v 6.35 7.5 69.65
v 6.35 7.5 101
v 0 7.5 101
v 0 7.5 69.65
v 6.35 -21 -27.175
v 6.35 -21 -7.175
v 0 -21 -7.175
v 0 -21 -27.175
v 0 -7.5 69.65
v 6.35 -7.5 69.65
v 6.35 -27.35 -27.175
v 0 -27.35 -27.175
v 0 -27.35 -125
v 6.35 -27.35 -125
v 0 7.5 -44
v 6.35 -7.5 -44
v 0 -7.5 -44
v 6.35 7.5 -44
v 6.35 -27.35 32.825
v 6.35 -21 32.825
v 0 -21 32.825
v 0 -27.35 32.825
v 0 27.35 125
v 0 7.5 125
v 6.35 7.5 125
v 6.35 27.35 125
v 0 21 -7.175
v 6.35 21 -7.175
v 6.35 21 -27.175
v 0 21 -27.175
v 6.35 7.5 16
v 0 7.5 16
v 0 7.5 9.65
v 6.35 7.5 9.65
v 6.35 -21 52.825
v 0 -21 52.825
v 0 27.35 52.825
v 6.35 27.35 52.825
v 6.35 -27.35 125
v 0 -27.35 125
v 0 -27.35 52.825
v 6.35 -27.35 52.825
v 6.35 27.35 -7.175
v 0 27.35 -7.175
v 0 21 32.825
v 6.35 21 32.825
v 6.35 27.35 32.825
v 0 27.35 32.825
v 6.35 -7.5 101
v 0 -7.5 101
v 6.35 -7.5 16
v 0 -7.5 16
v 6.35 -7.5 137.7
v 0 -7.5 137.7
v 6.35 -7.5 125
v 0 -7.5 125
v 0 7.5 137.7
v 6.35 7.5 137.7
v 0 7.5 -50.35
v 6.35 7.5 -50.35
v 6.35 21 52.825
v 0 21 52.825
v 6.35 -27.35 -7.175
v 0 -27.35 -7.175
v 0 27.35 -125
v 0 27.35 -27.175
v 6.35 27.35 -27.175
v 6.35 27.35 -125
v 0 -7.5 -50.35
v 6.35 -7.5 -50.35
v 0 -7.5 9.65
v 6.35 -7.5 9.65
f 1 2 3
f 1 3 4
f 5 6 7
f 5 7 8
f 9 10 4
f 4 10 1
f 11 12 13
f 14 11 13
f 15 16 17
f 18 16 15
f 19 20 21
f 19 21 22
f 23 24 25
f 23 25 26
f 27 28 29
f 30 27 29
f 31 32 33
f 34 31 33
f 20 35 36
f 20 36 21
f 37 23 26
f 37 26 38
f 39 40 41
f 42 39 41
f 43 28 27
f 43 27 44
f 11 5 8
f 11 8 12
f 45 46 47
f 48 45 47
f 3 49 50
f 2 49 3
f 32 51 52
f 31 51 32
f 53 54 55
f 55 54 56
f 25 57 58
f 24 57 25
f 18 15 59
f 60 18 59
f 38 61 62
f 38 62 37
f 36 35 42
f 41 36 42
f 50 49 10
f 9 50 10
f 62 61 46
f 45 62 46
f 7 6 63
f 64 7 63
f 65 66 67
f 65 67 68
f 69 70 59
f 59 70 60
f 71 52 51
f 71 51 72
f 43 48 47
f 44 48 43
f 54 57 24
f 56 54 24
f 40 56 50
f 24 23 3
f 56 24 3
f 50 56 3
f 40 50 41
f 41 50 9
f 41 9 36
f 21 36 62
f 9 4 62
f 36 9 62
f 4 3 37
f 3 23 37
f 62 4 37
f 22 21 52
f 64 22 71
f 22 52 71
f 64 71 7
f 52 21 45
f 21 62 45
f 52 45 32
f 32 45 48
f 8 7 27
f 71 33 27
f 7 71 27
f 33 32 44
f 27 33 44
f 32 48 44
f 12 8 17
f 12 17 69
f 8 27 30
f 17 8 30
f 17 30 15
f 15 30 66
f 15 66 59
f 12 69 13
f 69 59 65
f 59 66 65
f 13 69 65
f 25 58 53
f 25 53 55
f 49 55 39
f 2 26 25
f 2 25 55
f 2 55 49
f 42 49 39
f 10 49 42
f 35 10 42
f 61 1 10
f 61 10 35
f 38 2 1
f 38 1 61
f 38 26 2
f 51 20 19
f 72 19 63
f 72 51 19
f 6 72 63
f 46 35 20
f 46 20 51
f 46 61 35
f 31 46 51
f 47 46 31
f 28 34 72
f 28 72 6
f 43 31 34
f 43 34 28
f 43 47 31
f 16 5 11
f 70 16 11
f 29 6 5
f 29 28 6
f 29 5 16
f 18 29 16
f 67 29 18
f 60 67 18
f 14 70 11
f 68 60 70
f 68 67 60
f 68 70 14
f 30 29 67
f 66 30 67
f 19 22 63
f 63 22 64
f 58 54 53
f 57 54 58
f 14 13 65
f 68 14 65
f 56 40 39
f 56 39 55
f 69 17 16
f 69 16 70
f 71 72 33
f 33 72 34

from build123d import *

# Parameters (mm, degrees)
SKETCH1_W           = 250
SKETCH1_H           = 54.7
SKETCH1_W_2         = 12.7
SKETCH1_H_2         = 15
BOSS_EXTRUDE1_DEPTH = 6.35
SKETCH2_W           = 6.35
SKETCH2_H           = 15
CUT_EXTRUDE1_DEPTH  = 141.533394608
LPATTERN1_COUNT     = 3
LPATTERN1_PITCH     = 60
SKETCH3_W           = 25
SKETCH3_H           = 15
CUT_EXTRUDE2_DEPTH  = 141.533394608
SKETCH4_W           = 20
SKETCH4_H           = 6.35
CUT_EXTRUDE3_DEPTH  = 141.533394608


with BuildPart() as part:
    # Sketch1 → Boss-Extrude1 (new body)
    with BuildSketch(Plane(origin=(0, 0, 0), x_dir=(0, 0, -1), z_dir=(1, 0, 0))):
        Rectangle(SKETCH1_W, SKETCH1_H)
        with Locations((-131.35, 0)):
            Rectangle(SKETCH1_W_2, SKETCH1_H_2)
    extrude(amount=BOSS_EXTRUDE1_DEPTH)

    # Sketch2 → Cut-Extrude1 (cut, through all)
    with BuildSketch(Plane(origin=(6.35, 0, 0), x_dir=(0, 0, -1), z_dir=(1, 0, 0))):
        with Locations((-72.825, 0)):
            Rectangle(SKETCH2_W, SKETCH2_H)
    cut_extrude1 = extrude(amount=-CUT_EXTRUDE1_DEPTH, mode=Mode.SUBTRACT)

    # LPattern1: Cut-Extrude1 ×3
    with Locations(*[(0, 0, -i * LPATTERN1_PITCH) for i in range(1, LPATTERN1_COUNT)]):
        add(cut_extrude1, mode=Mode.SUBTRACT)

    # Sketch3 → Cut-Extrude2 (cut, through all)
    with BuildSketch(Plane(origin=(6.35, 0, 0), x_dir=(0, 0, -1), z_dir=(1, 0, 0))):
        with Locations((-88.5, 0)):
            Rectangle(SKETCH3_W, SKETCH3_H)
    extrude(amount=-CUT_EXTRUDE2_DEPTH, mode=Mode.SUBTRACT)

    # Sketch4 → Cut-Extrude3 (cut, through all)
    with BuildSketch(Plane(origin=(6.35, 0, 0), x_dir=(0, 0, -1), z_dir=(1, 0, 0))):
        with Locations((-42.825, 24.175)):
            Rectangle(SKETCH4_W, SKETCH4_H)
        with Locations((17.175, 24.175)):
            Rectangle(SKETCH4_W, SKETCH4_H)
    cut_extrude3 = extrude(amount=-CUT_EXTRUDE3_DEPTH, mode=Mode.SUBTRACT)

    # Mirror1: Cut-Extrude3 across plane
    add(cut_extrude3.mirror(Plane.ZX), mode=Mode.SUBTRACT)


solid = part.part
